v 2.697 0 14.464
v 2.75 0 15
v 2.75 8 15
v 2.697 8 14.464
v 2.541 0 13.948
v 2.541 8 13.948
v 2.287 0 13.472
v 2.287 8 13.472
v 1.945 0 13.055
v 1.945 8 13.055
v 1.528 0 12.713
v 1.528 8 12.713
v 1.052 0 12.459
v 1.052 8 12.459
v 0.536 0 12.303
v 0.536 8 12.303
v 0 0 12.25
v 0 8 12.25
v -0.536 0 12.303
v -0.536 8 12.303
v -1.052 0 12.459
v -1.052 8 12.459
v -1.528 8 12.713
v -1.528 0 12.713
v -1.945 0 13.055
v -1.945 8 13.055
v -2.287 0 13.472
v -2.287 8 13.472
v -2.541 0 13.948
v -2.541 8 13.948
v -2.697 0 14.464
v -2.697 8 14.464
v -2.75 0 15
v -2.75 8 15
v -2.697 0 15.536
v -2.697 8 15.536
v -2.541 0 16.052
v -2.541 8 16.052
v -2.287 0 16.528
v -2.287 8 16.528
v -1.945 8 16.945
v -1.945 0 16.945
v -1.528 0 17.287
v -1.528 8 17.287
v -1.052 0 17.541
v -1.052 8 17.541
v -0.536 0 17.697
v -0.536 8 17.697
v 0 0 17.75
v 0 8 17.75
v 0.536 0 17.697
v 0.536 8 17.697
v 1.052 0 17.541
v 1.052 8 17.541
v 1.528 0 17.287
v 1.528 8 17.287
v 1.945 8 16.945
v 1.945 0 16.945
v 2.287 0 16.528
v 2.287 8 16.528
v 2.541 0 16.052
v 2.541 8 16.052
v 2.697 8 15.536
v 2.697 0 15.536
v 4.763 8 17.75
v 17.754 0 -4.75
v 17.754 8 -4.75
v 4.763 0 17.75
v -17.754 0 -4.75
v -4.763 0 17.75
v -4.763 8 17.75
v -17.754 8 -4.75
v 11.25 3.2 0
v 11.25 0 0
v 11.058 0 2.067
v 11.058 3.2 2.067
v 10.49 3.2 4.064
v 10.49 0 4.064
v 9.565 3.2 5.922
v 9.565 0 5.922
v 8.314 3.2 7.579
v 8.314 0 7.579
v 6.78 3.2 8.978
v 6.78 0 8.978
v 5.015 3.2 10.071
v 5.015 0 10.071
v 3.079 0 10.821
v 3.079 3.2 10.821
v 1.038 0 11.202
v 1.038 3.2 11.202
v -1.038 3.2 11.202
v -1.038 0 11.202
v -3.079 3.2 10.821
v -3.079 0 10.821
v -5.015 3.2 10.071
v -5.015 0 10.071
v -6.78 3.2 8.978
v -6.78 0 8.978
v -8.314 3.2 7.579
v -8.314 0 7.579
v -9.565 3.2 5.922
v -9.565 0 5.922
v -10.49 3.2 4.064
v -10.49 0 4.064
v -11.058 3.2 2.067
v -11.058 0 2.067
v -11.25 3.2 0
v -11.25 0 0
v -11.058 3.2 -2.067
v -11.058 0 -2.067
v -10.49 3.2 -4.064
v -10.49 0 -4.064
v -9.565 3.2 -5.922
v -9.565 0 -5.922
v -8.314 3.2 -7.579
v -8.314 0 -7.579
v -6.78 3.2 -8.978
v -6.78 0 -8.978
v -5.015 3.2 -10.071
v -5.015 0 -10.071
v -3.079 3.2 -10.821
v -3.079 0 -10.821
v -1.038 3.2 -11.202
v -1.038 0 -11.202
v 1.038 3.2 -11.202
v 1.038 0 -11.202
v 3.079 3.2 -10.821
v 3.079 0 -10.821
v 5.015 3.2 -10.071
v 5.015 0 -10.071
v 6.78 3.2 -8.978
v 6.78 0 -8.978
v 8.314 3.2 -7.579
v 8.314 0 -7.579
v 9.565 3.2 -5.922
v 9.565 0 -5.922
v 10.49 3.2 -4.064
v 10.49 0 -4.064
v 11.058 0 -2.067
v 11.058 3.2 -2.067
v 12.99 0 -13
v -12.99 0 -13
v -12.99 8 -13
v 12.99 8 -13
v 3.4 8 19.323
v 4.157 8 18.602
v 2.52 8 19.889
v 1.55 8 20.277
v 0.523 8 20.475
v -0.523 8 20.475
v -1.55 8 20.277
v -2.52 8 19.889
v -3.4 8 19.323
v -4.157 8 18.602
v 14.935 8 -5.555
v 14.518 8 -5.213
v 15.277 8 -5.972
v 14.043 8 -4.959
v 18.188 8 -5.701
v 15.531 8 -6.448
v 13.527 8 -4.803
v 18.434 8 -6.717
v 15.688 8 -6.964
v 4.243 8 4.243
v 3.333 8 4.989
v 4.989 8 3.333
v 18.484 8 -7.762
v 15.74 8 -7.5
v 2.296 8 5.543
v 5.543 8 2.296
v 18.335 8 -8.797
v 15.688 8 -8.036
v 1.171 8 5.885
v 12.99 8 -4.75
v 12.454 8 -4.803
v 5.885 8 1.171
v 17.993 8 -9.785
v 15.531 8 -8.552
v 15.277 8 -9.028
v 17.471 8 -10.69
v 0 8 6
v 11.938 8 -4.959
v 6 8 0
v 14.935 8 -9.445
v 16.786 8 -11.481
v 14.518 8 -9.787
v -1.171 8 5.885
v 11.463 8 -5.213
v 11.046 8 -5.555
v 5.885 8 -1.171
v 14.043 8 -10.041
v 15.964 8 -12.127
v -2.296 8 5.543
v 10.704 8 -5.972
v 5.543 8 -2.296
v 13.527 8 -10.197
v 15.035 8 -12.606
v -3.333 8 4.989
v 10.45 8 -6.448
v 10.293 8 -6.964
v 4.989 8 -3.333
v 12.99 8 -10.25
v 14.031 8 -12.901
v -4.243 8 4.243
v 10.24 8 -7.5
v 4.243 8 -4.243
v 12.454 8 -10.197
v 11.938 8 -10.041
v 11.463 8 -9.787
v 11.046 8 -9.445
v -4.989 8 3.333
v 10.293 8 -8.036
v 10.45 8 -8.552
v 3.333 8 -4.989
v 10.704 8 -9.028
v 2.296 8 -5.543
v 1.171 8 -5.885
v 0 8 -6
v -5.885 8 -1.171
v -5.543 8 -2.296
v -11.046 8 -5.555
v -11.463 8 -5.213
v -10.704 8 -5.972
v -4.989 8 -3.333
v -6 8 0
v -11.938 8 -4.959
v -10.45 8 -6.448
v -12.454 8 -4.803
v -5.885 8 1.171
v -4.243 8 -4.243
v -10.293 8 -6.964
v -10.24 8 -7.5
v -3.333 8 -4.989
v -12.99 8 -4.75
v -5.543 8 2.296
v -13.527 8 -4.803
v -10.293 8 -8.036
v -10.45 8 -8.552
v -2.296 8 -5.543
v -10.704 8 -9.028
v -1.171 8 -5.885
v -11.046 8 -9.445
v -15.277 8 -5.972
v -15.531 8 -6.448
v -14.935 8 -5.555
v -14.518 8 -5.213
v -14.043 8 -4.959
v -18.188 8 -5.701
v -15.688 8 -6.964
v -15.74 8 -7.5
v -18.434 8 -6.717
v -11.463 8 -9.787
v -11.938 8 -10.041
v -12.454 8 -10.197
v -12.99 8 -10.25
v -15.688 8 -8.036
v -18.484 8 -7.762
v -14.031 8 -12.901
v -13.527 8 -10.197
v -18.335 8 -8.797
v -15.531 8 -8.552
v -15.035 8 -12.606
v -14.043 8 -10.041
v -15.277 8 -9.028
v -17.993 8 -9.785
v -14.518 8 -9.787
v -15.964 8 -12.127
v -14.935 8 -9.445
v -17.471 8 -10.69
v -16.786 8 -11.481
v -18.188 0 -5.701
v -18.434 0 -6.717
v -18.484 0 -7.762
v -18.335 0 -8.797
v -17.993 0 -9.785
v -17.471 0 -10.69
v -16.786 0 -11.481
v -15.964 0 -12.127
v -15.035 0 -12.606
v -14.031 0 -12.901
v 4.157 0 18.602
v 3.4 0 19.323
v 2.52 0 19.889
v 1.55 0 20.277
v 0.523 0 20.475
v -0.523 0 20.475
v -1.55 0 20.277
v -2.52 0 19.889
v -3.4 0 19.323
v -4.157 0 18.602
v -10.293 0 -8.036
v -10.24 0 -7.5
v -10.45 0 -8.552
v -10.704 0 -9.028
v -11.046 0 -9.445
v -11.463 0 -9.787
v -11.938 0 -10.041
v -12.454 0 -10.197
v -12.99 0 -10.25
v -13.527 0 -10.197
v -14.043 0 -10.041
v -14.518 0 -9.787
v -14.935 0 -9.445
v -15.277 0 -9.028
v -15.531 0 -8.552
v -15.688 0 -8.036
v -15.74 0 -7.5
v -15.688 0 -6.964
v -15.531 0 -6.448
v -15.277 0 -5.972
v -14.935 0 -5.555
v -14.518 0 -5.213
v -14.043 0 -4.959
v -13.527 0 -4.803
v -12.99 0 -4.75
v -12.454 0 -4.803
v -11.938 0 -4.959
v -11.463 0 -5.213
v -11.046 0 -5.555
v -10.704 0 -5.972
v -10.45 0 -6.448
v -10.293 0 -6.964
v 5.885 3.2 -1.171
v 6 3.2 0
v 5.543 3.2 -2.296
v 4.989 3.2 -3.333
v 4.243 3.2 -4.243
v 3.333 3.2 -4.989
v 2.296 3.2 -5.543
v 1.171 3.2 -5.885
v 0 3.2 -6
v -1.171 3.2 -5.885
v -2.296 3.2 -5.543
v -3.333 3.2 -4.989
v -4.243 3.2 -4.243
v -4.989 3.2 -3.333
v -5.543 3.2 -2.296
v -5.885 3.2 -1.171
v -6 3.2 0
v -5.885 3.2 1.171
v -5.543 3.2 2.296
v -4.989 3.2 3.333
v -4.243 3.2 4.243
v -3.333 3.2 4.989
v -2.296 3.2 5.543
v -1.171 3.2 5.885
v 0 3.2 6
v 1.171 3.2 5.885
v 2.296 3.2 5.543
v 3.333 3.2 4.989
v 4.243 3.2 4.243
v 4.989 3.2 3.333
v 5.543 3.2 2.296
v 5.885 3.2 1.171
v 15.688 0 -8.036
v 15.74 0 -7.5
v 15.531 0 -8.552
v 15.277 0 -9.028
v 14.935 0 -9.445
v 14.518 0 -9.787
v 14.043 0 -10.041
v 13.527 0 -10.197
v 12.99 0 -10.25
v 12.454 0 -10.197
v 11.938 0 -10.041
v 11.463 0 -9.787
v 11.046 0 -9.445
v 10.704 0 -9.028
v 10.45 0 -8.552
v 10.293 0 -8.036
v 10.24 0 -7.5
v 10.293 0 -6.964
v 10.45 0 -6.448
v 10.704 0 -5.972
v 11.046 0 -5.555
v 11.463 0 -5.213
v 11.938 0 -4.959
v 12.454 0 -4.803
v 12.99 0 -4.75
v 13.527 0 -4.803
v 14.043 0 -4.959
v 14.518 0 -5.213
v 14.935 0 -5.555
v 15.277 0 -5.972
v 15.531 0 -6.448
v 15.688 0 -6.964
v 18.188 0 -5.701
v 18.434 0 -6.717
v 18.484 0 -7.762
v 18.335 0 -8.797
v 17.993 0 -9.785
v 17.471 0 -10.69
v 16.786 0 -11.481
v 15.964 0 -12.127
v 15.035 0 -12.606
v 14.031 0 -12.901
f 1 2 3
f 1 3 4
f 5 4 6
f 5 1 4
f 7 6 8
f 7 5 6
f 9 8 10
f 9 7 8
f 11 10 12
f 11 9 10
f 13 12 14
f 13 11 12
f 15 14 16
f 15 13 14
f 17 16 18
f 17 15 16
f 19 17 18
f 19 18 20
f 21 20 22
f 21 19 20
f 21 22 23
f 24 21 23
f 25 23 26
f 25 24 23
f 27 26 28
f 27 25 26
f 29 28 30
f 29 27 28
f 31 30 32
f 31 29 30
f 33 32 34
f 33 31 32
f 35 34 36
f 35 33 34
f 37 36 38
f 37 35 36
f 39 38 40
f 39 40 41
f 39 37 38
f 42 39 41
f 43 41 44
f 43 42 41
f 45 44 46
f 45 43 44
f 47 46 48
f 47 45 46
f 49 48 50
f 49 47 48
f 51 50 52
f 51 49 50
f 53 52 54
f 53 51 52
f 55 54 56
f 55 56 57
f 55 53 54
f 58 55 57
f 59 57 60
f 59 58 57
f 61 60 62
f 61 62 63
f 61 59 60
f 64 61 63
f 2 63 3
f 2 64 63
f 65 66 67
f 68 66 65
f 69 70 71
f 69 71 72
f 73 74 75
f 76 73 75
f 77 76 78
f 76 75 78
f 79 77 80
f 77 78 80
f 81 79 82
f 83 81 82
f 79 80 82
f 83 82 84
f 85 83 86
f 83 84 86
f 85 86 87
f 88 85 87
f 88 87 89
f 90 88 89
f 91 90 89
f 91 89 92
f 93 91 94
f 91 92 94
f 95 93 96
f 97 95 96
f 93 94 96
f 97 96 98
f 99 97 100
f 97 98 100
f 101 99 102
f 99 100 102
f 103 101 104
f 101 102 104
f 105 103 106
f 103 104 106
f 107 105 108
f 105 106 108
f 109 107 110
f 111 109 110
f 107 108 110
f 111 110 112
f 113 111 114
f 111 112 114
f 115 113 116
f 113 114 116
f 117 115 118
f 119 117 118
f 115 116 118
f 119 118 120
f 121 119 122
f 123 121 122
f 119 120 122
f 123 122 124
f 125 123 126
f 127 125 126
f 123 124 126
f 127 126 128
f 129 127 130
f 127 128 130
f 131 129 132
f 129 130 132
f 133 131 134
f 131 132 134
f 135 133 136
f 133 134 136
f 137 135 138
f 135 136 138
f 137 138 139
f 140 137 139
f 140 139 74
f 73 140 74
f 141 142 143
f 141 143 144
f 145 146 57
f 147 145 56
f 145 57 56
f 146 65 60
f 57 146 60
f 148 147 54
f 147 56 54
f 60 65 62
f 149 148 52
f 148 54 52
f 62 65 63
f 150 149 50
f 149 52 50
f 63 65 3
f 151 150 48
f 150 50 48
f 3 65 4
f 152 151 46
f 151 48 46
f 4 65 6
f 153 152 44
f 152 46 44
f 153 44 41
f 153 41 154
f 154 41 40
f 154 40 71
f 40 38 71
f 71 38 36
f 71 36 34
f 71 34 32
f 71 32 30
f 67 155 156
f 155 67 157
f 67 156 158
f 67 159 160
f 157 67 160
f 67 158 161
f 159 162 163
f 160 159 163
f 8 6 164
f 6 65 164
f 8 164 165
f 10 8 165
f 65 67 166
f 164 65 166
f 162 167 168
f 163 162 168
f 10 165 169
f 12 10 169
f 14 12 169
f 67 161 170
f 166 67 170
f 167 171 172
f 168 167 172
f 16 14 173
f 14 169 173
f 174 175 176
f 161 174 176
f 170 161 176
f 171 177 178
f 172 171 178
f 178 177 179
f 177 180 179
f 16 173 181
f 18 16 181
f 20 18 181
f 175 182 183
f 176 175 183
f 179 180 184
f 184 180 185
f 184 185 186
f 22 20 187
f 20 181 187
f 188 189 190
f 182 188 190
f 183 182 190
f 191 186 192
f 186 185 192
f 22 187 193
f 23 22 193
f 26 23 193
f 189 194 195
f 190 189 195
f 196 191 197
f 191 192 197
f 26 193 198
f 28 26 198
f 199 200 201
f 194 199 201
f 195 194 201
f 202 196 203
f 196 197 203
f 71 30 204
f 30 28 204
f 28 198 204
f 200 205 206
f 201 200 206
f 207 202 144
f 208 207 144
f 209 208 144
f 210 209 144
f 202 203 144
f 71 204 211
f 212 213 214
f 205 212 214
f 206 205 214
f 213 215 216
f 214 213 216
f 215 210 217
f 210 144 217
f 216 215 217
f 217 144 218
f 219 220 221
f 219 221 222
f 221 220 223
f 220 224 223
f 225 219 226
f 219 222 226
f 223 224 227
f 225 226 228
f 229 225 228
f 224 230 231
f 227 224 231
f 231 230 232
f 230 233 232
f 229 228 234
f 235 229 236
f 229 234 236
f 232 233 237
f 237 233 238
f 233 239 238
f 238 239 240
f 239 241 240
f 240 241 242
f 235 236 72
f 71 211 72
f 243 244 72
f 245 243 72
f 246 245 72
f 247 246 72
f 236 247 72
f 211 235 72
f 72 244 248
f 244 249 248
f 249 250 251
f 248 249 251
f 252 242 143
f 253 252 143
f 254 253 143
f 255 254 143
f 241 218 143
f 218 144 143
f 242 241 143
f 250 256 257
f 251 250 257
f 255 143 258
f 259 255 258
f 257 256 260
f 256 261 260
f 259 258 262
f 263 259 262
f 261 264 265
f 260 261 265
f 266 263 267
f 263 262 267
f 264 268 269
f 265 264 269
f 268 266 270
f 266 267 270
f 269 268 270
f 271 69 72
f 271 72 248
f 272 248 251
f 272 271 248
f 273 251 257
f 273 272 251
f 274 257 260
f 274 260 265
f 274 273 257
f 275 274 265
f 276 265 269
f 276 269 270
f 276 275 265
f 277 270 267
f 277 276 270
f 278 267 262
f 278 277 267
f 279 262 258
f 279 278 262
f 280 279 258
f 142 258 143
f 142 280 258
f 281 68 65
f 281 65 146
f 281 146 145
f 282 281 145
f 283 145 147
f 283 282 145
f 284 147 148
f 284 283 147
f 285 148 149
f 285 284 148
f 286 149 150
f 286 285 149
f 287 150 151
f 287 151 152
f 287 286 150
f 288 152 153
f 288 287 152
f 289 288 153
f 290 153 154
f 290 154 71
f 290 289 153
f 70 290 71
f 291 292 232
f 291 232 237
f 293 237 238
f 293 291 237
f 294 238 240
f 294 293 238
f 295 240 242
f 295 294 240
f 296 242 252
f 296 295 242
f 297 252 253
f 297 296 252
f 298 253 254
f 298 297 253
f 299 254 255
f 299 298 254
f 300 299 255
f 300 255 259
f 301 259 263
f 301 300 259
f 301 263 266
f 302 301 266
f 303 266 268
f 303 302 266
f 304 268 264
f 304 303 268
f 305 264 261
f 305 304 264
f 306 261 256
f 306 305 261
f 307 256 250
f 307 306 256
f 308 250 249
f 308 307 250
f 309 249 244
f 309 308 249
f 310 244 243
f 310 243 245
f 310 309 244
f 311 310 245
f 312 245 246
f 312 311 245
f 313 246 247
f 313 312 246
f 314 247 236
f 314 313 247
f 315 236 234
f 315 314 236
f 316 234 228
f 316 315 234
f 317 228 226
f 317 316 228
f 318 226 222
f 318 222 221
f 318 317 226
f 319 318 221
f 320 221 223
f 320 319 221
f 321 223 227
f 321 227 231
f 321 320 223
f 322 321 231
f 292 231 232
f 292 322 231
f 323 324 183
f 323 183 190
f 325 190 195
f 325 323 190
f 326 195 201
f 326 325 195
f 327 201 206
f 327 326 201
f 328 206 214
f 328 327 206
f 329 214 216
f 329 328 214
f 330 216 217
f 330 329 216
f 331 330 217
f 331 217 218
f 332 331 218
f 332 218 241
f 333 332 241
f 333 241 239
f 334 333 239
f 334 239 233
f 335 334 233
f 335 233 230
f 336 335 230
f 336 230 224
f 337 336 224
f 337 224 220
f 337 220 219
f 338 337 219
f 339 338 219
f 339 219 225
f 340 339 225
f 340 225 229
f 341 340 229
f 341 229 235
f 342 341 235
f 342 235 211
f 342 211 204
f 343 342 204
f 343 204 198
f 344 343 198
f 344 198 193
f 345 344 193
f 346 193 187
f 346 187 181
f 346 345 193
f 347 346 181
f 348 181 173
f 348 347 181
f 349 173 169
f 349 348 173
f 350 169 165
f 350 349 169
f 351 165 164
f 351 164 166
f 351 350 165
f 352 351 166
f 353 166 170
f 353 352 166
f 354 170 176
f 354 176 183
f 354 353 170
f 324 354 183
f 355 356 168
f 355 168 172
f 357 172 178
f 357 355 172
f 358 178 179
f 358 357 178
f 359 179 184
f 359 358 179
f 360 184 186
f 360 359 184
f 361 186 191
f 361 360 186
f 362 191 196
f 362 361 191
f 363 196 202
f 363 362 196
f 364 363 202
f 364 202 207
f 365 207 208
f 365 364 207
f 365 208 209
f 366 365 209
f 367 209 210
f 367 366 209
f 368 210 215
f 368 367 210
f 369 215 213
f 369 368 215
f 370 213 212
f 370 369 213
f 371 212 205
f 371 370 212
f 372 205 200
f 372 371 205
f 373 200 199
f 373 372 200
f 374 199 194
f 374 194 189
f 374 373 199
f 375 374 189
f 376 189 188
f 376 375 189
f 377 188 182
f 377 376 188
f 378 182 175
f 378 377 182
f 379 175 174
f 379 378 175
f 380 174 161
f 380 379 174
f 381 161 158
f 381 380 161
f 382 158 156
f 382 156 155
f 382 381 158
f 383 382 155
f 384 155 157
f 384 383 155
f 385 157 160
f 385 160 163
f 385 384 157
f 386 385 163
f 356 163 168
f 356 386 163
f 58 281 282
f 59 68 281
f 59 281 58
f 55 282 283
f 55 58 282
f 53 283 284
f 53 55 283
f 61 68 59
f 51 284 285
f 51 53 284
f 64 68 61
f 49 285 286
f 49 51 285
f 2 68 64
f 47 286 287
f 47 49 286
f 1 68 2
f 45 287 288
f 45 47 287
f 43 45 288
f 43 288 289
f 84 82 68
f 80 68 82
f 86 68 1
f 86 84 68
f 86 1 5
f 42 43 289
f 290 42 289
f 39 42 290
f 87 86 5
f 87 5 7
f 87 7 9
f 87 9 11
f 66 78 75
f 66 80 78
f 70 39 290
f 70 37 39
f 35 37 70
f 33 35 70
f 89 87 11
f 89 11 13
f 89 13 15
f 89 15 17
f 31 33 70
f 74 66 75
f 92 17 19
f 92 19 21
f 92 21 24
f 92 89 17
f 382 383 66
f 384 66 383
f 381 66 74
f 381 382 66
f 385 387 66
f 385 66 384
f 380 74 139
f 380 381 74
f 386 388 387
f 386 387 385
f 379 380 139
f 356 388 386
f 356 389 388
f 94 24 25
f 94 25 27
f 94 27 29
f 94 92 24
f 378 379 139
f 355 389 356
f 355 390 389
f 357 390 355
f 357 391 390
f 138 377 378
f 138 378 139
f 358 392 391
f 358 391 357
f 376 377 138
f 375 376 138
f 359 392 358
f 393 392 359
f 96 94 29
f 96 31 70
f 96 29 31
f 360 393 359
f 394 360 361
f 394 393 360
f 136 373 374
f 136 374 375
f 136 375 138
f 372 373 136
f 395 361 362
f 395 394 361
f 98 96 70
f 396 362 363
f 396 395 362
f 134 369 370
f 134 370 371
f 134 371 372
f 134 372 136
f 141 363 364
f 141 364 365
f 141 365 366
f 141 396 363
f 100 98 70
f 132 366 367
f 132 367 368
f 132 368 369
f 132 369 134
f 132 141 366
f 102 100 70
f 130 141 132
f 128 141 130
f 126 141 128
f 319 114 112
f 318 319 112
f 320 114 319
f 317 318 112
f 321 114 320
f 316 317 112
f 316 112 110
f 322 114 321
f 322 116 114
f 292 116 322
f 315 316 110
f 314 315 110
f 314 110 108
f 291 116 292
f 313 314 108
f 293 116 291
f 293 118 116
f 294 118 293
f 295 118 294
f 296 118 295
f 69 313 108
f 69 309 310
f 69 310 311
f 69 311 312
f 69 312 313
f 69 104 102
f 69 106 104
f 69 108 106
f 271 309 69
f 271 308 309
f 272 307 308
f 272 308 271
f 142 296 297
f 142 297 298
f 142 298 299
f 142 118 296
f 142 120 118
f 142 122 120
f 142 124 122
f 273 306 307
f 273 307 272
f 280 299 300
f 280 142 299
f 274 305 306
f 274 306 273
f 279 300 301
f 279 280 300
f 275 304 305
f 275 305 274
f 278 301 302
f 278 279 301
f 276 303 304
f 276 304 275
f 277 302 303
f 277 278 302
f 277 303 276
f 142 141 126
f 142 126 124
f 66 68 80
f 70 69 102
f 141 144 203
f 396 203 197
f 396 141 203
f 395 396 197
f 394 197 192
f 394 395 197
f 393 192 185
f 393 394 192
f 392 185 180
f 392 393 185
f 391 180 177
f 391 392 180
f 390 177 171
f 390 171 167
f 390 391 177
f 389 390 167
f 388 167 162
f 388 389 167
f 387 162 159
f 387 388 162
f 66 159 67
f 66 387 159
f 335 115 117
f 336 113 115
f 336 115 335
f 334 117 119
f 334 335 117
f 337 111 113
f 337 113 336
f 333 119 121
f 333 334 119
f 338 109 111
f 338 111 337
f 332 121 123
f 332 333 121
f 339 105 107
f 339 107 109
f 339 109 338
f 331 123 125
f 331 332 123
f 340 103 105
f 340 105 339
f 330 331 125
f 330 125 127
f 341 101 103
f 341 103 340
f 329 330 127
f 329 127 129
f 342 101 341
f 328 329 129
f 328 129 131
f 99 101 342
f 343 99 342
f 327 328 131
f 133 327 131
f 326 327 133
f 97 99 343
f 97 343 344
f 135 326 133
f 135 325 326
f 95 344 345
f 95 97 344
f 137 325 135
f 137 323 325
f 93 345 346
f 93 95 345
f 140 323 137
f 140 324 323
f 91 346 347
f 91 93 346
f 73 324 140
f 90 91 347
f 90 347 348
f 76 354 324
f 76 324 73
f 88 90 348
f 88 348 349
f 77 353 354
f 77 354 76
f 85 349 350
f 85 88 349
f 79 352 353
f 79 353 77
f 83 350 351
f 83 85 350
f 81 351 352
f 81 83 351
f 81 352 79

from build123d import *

# Parameters (mm, degrees)
SKETCH1_R           = 6
SKETCH1_R_2         = 2.75
BOSS_EXTRUDE1_DEPTH = 8
SKETCH2_R           = 11.25
CUT_EXTRUDE1_DEPTH  = 3.2


with BuildPart() as part:
    # Sketch1 → Boss-Extrude1 (new body)
    with BuildSketch(Plane(origin=(0, 0, 0), x_dir=(1, 0, 0), z_dir=(0, 1, 0))):
        with BuildLine():
            Line((-12.990381057, 13), (12.990381057, 13))
            ThreePointArc((12.990381057, 13), (17.753520778, 10.25), (17.753520778, 4.75))
            Line((17.753520778, 4.75), (4.763139721, -17.75))
            ThreePointArc((4.763139721, -17.75), (0, -20.5), (-4.763139721, -17.75))
            Line((-4.763139721, -17.75), (-17.753520778, 4.75))
            ThreePointArc((-17.753520778, 4.75), (-17.753520778, 10.25), (-12.990381057, 13))
        make_face()
        Circle(SKETCH1_R, mode=Mode.SUBTRACT)
        with Locations((-12.990381057, 7.5)):
            Circle(SKETCH1_R_2, mode=Mode.SUBTRACT)
        with Locations((12.990381057, 7.5)):
            Circle(SKETCH1_R_2, mode=Mode.SUBTRACT)
        with Locations((0, -15)):
            Circle(SKETCH1_R_2, mode=Mode.SUBTRACT)
    extrude(amount=BOSS_EXTRUDE1_DEPTH)

    # Sketch2 → Cut-Extrude1 (cut)
    with BuildSketch(Plane.XZ):
        Circle(SKETCH2_R)
    extrude(amount=-CUT_EXTRUDE1_DEPTH, mode=Mode.SUBTRACT)


solid = part.part
